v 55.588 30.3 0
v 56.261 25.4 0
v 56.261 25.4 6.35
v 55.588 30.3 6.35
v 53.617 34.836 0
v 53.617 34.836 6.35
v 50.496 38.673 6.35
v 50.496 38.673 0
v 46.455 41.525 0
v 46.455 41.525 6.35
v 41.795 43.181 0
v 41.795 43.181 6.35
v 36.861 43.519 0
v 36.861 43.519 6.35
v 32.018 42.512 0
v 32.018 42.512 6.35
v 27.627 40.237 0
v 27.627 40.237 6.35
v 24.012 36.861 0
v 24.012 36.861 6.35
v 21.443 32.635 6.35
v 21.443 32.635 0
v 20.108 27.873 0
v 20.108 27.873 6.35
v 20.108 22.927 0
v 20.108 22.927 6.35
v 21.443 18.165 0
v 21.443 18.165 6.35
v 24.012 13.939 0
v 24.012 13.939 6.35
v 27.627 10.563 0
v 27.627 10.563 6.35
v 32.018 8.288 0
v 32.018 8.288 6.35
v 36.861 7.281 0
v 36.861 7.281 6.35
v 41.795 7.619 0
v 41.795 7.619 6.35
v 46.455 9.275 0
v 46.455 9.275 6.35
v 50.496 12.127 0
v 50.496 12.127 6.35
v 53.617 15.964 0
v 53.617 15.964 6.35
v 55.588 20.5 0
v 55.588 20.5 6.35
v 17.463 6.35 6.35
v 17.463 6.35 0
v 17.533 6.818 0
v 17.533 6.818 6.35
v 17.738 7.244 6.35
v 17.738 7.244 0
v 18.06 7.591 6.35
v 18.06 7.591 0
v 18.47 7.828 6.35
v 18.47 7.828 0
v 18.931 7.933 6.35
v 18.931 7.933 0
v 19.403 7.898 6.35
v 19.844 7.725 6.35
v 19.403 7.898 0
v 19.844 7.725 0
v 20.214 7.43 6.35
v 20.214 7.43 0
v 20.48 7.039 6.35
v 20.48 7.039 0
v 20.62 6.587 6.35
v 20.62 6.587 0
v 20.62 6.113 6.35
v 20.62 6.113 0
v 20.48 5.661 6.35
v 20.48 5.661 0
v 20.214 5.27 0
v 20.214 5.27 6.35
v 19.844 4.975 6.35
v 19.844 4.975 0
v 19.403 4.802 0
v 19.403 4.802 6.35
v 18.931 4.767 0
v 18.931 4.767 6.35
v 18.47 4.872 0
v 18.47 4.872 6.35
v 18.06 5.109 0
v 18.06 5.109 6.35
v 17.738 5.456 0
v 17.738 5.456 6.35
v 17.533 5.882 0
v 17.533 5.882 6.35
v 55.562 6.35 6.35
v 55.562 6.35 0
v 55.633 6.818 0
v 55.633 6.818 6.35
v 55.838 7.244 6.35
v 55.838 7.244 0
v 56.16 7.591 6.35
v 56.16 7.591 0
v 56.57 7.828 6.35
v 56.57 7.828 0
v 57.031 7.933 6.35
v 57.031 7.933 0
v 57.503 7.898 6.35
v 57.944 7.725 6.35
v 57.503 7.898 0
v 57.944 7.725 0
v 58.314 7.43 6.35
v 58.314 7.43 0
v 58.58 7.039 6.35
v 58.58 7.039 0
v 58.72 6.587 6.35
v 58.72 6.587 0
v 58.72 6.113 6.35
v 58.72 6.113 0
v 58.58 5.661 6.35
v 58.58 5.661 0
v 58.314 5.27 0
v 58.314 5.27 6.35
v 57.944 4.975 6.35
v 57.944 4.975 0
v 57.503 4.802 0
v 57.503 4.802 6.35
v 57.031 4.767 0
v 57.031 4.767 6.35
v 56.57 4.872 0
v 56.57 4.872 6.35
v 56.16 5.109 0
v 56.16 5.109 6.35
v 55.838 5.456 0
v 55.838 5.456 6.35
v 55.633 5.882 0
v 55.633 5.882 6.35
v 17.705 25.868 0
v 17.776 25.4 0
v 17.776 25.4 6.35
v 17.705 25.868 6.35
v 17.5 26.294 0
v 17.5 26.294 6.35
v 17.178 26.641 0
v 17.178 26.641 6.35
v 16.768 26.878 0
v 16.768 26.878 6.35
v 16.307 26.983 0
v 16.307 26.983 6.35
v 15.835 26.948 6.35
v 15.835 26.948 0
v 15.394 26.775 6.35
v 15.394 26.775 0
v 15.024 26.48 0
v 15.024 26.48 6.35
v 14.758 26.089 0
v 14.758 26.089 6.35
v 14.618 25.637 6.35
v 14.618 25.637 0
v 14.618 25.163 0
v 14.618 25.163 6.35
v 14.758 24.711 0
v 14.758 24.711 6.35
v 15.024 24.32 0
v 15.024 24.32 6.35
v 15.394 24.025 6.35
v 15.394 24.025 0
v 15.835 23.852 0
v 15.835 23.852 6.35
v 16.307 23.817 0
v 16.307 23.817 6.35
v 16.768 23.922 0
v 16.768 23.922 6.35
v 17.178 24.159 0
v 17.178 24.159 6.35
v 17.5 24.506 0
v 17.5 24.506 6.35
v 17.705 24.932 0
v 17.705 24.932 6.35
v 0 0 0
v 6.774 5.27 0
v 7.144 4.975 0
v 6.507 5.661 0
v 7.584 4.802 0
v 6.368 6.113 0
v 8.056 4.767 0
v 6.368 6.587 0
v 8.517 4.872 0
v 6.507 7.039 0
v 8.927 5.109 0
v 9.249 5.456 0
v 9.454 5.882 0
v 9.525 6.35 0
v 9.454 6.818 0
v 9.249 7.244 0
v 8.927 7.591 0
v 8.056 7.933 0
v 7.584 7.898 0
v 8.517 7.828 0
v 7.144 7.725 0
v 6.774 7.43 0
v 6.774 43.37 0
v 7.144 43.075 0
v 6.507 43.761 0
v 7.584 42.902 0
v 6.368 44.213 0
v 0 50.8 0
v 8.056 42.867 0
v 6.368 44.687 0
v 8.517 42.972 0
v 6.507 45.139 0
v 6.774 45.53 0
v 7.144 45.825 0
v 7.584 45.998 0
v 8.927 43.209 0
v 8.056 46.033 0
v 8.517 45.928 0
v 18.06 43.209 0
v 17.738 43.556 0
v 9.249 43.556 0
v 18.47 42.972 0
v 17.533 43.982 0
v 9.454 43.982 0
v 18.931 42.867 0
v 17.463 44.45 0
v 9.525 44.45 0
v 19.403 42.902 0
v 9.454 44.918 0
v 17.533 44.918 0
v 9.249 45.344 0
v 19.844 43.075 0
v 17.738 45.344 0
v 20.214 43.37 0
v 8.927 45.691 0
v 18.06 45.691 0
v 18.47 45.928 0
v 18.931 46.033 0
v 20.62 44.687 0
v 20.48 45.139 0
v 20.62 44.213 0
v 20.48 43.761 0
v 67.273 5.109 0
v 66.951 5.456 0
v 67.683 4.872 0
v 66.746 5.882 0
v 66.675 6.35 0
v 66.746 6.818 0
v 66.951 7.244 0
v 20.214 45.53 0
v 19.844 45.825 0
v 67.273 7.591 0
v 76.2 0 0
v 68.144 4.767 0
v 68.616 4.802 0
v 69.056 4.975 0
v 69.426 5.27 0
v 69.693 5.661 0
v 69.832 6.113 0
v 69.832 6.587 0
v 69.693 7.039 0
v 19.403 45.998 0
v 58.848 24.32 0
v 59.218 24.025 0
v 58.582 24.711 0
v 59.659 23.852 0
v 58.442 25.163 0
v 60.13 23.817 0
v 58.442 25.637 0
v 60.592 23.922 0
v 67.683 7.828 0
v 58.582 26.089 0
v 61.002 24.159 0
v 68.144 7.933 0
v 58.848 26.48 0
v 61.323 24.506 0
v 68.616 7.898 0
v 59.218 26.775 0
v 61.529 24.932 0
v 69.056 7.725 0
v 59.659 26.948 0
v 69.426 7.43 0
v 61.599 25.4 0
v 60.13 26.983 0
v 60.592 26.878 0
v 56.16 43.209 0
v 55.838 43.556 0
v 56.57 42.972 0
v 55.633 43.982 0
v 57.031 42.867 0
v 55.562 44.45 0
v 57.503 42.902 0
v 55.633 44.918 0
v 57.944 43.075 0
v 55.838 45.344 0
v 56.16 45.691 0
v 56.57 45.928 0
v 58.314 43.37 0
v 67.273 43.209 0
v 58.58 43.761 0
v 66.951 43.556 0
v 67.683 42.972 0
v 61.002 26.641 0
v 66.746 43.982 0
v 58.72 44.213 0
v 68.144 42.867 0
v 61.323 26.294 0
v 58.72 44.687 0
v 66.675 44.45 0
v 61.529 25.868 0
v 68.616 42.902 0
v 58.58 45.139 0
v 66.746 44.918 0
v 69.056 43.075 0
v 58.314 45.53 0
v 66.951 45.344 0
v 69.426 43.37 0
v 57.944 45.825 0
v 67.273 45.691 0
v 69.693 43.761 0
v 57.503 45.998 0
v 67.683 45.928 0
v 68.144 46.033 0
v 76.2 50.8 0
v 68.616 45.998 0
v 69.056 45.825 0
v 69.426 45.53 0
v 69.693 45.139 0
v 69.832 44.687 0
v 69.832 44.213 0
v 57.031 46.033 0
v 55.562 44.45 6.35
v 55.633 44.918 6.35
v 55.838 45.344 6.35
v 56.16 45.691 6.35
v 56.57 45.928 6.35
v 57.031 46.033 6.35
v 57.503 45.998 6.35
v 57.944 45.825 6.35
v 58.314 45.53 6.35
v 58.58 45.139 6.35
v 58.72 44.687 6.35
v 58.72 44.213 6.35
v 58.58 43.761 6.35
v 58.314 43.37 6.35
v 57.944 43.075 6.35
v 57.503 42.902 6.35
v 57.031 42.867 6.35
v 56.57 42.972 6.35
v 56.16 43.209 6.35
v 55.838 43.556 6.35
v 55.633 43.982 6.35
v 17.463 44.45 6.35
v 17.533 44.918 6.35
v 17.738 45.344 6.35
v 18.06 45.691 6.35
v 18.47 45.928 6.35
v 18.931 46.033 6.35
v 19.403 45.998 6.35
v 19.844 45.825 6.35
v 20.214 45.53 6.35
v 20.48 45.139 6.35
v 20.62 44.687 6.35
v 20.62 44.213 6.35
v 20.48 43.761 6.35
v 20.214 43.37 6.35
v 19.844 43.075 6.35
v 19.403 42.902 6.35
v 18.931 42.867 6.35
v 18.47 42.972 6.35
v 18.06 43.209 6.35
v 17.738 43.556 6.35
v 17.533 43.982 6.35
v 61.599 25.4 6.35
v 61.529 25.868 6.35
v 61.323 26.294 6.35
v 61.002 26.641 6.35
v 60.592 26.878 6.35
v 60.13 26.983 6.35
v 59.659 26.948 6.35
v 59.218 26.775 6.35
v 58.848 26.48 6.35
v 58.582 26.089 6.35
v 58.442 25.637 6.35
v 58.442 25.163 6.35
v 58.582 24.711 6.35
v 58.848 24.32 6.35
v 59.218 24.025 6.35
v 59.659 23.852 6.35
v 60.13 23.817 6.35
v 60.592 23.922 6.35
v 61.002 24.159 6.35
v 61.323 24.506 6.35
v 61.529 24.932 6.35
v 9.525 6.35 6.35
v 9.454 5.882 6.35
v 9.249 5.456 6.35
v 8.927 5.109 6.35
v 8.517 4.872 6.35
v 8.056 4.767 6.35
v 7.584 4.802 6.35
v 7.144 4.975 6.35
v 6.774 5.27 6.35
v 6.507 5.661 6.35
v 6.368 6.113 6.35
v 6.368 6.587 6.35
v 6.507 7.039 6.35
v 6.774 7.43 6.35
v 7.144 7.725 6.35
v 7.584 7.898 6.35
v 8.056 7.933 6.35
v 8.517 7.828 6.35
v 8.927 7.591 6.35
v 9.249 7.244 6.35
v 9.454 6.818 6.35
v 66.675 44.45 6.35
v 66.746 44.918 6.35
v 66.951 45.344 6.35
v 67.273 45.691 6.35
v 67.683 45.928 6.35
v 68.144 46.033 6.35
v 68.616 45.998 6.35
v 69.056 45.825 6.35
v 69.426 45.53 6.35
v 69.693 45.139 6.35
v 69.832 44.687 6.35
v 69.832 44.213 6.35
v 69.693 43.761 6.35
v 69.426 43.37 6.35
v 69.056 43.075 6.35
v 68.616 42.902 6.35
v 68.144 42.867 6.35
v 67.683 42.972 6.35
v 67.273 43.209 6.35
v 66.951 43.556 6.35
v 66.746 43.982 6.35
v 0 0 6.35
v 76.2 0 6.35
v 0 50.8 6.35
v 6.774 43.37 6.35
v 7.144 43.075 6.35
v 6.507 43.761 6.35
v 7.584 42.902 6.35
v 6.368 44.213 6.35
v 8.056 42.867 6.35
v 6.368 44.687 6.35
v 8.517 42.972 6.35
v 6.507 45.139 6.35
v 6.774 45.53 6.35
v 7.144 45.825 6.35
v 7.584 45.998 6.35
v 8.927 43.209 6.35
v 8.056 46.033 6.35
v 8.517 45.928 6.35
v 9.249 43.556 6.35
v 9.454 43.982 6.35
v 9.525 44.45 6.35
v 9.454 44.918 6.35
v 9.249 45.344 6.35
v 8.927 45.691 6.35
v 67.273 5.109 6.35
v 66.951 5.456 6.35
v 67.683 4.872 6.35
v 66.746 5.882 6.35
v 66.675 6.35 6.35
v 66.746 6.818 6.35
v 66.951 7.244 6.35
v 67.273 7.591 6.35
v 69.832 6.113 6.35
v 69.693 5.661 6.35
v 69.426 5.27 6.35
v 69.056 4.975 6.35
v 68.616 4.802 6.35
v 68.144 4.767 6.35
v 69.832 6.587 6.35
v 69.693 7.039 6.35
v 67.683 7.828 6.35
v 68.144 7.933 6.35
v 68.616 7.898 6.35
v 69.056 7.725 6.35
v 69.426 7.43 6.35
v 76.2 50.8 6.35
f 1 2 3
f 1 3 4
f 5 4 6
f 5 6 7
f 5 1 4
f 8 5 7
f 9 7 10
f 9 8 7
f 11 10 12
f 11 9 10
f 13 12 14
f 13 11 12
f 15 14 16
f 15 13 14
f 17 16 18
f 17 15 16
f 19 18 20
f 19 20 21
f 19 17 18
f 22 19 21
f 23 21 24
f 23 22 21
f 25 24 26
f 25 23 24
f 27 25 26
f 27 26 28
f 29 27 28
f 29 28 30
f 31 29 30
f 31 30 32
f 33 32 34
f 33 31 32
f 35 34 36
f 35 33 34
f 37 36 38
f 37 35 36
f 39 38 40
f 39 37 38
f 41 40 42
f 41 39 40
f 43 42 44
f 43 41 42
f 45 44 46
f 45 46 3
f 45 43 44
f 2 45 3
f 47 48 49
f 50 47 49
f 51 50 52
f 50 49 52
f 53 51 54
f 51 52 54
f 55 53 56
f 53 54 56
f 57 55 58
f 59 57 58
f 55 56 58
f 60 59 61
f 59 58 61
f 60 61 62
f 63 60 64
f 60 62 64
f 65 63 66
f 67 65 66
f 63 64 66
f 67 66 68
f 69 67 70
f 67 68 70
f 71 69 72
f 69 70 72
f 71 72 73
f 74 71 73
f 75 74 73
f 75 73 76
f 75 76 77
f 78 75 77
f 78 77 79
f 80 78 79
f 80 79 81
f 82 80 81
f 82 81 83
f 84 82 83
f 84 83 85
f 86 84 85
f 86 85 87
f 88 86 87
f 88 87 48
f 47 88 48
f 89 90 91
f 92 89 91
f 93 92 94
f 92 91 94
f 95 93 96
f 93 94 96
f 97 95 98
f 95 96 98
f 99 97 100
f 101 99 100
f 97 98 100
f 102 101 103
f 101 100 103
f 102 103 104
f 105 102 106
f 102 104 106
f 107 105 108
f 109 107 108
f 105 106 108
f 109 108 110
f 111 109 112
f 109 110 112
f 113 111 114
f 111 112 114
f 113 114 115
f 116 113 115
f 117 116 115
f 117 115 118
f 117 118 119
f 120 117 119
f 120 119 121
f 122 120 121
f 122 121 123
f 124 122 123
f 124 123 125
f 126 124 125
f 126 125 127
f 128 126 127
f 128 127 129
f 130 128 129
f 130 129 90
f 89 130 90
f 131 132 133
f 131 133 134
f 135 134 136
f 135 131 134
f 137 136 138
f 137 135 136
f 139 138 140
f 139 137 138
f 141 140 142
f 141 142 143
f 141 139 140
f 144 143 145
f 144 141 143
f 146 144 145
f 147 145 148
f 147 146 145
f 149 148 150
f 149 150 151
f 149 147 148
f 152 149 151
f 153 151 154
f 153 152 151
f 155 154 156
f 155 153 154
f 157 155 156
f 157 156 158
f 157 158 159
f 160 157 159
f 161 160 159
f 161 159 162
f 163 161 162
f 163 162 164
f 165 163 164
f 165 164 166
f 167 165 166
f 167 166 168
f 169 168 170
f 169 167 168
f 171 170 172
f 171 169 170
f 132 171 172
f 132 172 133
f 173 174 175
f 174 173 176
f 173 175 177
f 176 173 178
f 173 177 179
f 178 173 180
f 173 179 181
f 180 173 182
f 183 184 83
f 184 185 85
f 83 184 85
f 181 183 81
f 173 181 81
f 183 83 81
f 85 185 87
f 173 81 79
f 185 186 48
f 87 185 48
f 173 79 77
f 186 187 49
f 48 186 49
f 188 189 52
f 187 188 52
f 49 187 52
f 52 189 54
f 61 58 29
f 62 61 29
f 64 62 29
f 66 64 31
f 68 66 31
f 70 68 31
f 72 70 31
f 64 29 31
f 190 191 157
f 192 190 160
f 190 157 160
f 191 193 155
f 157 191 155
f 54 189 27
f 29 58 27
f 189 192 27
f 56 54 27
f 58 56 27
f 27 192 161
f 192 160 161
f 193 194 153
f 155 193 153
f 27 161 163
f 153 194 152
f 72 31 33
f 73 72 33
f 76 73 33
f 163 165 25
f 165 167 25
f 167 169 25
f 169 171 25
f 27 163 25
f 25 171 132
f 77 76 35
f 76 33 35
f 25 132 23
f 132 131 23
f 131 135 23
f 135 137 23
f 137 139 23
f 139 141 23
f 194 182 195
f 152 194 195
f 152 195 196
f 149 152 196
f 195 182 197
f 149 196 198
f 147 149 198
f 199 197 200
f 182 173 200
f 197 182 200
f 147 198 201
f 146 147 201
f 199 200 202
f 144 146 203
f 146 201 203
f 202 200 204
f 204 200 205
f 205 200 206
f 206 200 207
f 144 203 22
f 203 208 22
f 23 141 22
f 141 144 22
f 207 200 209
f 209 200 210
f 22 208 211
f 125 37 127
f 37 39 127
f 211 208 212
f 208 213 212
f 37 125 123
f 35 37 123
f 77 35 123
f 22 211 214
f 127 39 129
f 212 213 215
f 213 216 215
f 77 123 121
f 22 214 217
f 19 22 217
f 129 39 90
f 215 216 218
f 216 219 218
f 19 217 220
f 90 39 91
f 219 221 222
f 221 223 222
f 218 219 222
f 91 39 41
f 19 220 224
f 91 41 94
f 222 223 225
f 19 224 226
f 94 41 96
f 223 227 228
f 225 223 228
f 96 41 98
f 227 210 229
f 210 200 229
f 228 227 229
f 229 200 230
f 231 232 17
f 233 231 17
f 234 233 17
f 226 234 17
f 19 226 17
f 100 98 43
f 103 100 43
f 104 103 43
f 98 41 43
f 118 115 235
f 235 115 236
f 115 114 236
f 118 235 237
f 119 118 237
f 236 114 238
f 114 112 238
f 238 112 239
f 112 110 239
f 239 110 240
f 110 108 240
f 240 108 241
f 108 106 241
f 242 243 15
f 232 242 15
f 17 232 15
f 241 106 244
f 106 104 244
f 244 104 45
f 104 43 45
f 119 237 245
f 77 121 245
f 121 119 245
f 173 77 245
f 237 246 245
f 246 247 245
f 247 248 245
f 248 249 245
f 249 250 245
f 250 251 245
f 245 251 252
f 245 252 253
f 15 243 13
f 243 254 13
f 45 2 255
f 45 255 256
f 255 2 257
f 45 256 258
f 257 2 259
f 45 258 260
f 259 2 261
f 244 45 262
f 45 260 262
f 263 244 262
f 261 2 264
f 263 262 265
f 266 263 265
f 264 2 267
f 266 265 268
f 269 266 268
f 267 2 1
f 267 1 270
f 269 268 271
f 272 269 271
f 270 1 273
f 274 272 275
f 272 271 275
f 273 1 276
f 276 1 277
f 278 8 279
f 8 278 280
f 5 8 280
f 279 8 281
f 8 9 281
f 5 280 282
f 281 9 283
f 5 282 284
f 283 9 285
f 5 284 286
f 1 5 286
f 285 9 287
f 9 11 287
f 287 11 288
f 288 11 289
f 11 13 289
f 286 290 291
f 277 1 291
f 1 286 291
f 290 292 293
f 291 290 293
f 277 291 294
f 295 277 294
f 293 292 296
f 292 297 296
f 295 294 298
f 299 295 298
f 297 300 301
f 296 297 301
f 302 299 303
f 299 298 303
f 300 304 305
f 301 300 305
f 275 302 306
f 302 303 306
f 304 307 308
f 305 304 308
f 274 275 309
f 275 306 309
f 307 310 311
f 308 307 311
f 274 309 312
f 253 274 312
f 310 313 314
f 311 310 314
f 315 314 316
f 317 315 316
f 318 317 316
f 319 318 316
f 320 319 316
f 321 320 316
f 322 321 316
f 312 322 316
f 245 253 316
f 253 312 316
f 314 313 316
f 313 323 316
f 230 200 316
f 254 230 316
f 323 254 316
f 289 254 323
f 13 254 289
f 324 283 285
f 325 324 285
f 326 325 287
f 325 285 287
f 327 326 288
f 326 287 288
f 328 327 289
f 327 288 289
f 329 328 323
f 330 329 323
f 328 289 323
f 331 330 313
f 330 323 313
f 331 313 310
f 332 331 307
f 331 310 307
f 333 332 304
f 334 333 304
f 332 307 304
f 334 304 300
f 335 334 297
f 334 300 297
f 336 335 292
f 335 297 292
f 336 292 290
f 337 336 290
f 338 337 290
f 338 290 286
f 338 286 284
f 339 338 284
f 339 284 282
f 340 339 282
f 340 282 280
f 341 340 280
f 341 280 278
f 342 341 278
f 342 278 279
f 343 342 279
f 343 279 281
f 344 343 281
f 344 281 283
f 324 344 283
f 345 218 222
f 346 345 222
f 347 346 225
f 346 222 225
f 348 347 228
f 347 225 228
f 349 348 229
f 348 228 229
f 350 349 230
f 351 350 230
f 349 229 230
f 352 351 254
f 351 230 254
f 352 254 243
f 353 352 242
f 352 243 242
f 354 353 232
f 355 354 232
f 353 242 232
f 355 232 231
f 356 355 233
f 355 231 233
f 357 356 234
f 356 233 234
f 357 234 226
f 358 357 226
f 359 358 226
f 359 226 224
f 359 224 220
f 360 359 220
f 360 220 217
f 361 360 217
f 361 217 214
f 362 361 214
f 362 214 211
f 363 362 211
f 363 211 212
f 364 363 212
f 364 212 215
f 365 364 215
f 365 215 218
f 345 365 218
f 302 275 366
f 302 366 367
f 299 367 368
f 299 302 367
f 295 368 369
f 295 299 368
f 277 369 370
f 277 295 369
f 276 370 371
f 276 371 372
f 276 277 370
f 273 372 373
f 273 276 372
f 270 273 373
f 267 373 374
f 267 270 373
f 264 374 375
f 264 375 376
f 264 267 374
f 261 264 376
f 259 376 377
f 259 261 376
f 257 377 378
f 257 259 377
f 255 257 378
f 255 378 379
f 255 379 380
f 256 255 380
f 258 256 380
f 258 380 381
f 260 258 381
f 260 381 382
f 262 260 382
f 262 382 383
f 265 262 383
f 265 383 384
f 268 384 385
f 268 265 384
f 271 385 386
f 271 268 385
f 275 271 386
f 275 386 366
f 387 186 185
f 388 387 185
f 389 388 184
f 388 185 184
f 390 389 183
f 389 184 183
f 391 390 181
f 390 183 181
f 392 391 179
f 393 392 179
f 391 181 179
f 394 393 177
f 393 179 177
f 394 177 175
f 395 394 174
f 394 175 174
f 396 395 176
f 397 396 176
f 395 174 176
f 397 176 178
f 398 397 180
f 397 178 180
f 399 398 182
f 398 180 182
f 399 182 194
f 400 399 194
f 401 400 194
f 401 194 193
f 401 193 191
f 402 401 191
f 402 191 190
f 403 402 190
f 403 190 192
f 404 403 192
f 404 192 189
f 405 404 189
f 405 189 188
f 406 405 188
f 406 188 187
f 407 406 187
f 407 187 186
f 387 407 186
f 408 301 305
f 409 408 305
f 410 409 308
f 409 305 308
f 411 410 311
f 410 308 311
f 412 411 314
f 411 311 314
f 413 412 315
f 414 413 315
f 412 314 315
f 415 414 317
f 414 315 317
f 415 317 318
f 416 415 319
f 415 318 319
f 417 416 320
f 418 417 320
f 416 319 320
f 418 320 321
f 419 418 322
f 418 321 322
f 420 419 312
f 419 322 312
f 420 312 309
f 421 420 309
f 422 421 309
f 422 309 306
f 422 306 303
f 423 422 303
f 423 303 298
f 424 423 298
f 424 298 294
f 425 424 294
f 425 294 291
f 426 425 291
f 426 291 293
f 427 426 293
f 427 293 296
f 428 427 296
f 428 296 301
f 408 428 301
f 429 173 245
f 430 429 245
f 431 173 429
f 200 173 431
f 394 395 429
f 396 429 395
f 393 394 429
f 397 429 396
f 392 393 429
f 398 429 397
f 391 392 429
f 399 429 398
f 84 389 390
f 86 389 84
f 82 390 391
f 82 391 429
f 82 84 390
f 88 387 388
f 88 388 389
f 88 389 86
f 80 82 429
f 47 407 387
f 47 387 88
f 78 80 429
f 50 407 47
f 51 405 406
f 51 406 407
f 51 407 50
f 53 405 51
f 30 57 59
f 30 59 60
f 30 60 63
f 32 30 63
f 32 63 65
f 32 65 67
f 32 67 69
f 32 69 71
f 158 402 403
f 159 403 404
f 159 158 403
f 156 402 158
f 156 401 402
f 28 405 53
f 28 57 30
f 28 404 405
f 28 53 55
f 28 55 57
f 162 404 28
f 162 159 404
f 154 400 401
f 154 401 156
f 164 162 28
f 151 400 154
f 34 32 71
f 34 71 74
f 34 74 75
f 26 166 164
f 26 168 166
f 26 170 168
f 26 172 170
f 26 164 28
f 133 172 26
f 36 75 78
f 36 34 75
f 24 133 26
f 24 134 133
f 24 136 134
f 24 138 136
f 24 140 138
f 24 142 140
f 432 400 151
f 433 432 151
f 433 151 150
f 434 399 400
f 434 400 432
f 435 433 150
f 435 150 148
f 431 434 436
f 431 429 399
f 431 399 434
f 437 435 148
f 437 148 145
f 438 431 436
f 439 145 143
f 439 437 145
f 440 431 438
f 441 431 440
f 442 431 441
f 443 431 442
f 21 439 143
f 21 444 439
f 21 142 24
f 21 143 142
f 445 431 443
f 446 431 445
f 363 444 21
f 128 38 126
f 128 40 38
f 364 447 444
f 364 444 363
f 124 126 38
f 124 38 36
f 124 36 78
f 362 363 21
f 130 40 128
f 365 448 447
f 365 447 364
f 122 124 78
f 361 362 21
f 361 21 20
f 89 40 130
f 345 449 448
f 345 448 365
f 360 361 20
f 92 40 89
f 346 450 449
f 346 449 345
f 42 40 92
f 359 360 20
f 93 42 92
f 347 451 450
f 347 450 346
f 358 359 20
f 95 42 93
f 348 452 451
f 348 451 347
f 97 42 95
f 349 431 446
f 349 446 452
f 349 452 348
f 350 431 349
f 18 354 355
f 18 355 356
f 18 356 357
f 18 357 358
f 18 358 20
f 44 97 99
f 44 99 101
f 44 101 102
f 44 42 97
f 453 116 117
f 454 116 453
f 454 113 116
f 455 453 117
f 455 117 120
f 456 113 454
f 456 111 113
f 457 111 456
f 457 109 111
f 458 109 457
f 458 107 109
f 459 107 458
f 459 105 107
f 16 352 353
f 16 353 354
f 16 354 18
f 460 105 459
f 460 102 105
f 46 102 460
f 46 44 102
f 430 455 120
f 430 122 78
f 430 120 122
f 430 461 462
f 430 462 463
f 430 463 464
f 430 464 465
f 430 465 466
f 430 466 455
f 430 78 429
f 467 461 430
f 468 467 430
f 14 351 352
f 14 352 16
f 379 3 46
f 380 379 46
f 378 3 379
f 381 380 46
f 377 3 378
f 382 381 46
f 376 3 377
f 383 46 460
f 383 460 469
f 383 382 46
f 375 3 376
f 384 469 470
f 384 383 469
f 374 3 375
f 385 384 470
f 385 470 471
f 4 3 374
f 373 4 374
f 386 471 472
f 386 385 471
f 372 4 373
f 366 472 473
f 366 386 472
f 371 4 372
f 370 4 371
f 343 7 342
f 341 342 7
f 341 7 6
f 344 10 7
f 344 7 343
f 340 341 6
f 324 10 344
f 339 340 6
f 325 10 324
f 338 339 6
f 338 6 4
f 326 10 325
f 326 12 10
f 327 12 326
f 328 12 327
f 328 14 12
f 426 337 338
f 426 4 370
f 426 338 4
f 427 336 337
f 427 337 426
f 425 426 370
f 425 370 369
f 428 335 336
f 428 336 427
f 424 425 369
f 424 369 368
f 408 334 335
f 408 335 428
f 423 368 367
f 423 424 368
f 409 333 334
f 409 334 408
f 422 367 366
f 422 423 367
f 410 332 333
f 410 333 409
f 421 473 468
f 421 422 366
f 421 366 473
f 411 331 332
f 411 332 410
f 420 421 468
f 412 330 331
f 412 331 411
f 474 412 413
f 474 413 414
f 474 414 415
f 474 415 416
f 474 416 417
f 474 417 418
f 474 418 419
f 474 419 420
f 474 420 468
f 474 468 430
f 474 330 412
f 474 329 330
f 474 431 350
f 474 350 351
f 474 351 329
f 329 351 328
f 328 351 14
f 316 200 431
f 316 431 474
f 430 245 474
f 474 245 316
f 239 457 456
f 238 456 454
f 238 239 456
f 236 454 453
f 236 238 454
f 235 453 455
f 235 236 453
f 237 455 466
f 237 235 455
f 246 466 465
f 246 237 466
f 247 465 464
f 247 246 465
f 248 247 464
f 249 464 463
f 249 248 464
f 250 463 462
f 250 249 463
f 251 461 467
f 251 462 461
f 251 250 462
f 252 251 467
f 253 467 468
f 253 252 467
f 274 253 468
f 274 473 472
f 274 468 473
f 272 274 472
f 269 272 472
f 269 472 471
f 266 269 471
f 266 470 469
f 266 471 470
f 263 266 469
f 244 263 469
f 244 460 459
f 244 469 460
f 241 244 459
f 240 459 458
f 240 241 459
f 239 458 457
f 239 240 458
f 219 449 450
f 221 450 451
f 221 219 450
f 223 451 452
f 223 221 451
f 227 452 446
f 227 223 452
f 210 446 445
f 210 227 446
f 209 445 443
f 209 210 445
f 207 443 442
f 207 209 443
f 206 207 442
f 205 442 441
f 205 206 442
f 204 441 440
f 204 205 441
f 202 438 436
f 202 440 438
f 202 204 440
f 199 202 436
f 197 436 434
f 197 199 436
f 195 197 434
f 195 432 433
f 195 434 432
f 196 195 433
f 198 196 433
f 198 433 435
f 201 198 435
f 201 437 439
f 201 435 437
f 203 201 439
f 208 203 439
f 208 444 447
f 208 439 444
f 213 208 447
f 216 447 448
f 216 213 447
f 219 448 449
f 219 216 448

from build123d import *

# Parameters (mm, degrees)
SKETCH1_W               = 76.2
SKETCH1_H               = 50.8
BOSS_EXTRUDE1_DEPTH     = 6.35
CAVITY5_OUTLINE_R       = 18.161
CAVITY5_OUTLINE_R_2     = 1.5875
CAVITY5_DEPTH           = 6.35
SKETCH3_R               = 1.5875
CUT_EXTRUDE1_DEPTH      = 92.800885072
MIRROR2_COPY_1_SKETCH_R = 1.5875
MIRROR2_COPY_1_DEPTH    = 92.800885072
SKETCH4_R               = 1.5875
CUT_EXTRUDE2_DEPTH      = 92.800885072


# Read off the part's stored shape, not the designer's step: Cavity5
with BuildPart() as part:
    # Sketch1 → Boss-Extrude1 (new body)
    with BuildSketch(Plane.XY):
        with Locations((38.1, 25.4)):
            Rectangle(SKETCH1_W, SKETCH1_H)
    extrude(amount=BOSS_EXTRUDE1_DEPTH)

    # Cavity5 outline → Cavity5 (cut)
    with BuildSketch(Plane.XY):
        with Locations((38.1, 25.4)):
            Circle(CAVITY5_OUTLINE_R)
        with Locations((16.188175065, 25.4)):
            Circle(CAVITY5_OUTLINE_R_2)
        with Locations((60.011824935, 25.4)):
            Circle(CAVITY5_OUTLINE_R_2)
    extrude(amount=CAVITY5_DEPTH, mode=Mode.SUBTRACT)

    # Sketch3 → Cut-Extrude1 (cut, through all)
    with BuildSketch(Plane(origin=(0, 0, 0), x_dir=(-1, 0, 0), z_dir=(0, 0, -1))):
        with Locations((-68.2625, 44.45)):
            Circle(SKETCH3_R)
    cut_extrude1 = extrude(amount=-CUT_EXTRUDE1_DEPTH, mode=Mode.SUBTRACT)

    # Mirror1: Cut-Extrude1 across plane
    add(cut_extrude1.mirror(Plane(origin=(38.1, 0, 0), x_dir=(0, 0, 1), z_dir=(1, 0, 0))), mode=Mode.SUBTRACT)

    # Mirror2: Cut-Extrude1 across plane
    add(cut_extrude1.mirror(Plane.ZX.offset(25.4)), mode=Mode.SUBTRACT)

    # Mirror2 copy 1 sketch → Mirror2 copy 1 (cut, through all)
    with BuildSketch(Plane(origin=(76.2, 50.8, 0), x_dir=(1, 0, 0), z_dir=(0, 0, -1))):
        with Locations((-68.2625, 44.45)):
            Circle(MIRROR2_COPY_1_SKETCH_R)
    extrude(amount=-MIRROR2_COPY_1_DEPTH, mode=Mode.SUBTRACT)

    # Sketch4 → Cut-Extrude2 (cut, through all)
    with BuildSketch(Plane(origin=(0, 0, 0), x_dir=(-1, 0, 0), z_dir=(0, 0, -1))):
        with Locations((-19.05, 44.45)):
            Circle(SKETCH4_R)
        with Locations((-57.15, 44.45)):
            Circle(SKETCH4_R)
        with Locations((-57.15, 6.35)):
            Circle(SKETCH4_R)
        with Locations((-19.05, 6.35)):
            Circle(SKETCH4_R)
    extrude(amount=-CUT_EXTRUDE2_DEPTH, mode=Mode.SUBTRACT)


solid = part.part
